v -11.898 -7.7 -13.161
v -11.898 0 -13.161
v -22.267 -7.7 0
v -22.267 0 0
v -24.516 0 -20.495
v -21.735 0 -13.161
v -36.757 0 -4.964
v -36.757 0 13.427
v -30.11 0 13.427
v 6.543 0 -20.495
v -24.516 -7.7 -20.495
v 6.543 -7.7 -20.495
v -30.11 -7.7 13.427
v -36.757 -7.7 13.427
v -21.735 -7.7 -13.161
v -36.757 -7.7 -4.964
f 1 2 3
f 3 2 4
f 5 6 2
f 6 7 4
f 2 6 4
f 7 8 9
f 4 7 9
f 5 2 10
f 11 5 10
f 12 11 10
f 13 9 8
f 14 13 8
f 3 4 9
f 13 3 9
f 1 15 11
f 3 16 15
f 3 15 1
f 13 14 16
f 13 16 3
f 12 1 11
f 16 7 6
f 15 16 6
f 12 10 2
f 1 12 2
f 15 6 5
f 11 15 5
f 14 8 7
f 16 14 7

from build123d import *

# Parameters (mm, degrees)
F1_DEPTH = 7.7


with BuildPart() as f1:
    # F0 (on Front) → F1 (new body)
    with BuildSketch(Plane.XZ):
        Polygon((-30.109993, 13.426532), (-36.756793, 13.426532), (-31.572289, -1.861103), (-21.73503, -13.16066), (-11.897769, -13.16066), (-22.266773, 0), align=None)
        Polygon((-31.572289, -1.861103), (-36.756793, 13.426532), (-36.756793, -4.963943), (-21.73503, -13.16066), align=None)
        Polygon((-11.897769, -13.16066), (-21.73503, -13.16066), (-15.544919, -15.920161), (-5.281532, -20.495497), (6.542794, -20.495497), align=None)
        Polygon((-15.544919, -15.920161), (-21.73503, -13.16066), (-24.515769, -20.495497), (-21.73503, -20.495497), align=None)
        Polygon((-5.281532, -20.495497), (-15.544919, -15.920161), (-21.73503, -20.495497), align=None)
    extrude(amount=F1_DEPTH)


solid = f1.part
